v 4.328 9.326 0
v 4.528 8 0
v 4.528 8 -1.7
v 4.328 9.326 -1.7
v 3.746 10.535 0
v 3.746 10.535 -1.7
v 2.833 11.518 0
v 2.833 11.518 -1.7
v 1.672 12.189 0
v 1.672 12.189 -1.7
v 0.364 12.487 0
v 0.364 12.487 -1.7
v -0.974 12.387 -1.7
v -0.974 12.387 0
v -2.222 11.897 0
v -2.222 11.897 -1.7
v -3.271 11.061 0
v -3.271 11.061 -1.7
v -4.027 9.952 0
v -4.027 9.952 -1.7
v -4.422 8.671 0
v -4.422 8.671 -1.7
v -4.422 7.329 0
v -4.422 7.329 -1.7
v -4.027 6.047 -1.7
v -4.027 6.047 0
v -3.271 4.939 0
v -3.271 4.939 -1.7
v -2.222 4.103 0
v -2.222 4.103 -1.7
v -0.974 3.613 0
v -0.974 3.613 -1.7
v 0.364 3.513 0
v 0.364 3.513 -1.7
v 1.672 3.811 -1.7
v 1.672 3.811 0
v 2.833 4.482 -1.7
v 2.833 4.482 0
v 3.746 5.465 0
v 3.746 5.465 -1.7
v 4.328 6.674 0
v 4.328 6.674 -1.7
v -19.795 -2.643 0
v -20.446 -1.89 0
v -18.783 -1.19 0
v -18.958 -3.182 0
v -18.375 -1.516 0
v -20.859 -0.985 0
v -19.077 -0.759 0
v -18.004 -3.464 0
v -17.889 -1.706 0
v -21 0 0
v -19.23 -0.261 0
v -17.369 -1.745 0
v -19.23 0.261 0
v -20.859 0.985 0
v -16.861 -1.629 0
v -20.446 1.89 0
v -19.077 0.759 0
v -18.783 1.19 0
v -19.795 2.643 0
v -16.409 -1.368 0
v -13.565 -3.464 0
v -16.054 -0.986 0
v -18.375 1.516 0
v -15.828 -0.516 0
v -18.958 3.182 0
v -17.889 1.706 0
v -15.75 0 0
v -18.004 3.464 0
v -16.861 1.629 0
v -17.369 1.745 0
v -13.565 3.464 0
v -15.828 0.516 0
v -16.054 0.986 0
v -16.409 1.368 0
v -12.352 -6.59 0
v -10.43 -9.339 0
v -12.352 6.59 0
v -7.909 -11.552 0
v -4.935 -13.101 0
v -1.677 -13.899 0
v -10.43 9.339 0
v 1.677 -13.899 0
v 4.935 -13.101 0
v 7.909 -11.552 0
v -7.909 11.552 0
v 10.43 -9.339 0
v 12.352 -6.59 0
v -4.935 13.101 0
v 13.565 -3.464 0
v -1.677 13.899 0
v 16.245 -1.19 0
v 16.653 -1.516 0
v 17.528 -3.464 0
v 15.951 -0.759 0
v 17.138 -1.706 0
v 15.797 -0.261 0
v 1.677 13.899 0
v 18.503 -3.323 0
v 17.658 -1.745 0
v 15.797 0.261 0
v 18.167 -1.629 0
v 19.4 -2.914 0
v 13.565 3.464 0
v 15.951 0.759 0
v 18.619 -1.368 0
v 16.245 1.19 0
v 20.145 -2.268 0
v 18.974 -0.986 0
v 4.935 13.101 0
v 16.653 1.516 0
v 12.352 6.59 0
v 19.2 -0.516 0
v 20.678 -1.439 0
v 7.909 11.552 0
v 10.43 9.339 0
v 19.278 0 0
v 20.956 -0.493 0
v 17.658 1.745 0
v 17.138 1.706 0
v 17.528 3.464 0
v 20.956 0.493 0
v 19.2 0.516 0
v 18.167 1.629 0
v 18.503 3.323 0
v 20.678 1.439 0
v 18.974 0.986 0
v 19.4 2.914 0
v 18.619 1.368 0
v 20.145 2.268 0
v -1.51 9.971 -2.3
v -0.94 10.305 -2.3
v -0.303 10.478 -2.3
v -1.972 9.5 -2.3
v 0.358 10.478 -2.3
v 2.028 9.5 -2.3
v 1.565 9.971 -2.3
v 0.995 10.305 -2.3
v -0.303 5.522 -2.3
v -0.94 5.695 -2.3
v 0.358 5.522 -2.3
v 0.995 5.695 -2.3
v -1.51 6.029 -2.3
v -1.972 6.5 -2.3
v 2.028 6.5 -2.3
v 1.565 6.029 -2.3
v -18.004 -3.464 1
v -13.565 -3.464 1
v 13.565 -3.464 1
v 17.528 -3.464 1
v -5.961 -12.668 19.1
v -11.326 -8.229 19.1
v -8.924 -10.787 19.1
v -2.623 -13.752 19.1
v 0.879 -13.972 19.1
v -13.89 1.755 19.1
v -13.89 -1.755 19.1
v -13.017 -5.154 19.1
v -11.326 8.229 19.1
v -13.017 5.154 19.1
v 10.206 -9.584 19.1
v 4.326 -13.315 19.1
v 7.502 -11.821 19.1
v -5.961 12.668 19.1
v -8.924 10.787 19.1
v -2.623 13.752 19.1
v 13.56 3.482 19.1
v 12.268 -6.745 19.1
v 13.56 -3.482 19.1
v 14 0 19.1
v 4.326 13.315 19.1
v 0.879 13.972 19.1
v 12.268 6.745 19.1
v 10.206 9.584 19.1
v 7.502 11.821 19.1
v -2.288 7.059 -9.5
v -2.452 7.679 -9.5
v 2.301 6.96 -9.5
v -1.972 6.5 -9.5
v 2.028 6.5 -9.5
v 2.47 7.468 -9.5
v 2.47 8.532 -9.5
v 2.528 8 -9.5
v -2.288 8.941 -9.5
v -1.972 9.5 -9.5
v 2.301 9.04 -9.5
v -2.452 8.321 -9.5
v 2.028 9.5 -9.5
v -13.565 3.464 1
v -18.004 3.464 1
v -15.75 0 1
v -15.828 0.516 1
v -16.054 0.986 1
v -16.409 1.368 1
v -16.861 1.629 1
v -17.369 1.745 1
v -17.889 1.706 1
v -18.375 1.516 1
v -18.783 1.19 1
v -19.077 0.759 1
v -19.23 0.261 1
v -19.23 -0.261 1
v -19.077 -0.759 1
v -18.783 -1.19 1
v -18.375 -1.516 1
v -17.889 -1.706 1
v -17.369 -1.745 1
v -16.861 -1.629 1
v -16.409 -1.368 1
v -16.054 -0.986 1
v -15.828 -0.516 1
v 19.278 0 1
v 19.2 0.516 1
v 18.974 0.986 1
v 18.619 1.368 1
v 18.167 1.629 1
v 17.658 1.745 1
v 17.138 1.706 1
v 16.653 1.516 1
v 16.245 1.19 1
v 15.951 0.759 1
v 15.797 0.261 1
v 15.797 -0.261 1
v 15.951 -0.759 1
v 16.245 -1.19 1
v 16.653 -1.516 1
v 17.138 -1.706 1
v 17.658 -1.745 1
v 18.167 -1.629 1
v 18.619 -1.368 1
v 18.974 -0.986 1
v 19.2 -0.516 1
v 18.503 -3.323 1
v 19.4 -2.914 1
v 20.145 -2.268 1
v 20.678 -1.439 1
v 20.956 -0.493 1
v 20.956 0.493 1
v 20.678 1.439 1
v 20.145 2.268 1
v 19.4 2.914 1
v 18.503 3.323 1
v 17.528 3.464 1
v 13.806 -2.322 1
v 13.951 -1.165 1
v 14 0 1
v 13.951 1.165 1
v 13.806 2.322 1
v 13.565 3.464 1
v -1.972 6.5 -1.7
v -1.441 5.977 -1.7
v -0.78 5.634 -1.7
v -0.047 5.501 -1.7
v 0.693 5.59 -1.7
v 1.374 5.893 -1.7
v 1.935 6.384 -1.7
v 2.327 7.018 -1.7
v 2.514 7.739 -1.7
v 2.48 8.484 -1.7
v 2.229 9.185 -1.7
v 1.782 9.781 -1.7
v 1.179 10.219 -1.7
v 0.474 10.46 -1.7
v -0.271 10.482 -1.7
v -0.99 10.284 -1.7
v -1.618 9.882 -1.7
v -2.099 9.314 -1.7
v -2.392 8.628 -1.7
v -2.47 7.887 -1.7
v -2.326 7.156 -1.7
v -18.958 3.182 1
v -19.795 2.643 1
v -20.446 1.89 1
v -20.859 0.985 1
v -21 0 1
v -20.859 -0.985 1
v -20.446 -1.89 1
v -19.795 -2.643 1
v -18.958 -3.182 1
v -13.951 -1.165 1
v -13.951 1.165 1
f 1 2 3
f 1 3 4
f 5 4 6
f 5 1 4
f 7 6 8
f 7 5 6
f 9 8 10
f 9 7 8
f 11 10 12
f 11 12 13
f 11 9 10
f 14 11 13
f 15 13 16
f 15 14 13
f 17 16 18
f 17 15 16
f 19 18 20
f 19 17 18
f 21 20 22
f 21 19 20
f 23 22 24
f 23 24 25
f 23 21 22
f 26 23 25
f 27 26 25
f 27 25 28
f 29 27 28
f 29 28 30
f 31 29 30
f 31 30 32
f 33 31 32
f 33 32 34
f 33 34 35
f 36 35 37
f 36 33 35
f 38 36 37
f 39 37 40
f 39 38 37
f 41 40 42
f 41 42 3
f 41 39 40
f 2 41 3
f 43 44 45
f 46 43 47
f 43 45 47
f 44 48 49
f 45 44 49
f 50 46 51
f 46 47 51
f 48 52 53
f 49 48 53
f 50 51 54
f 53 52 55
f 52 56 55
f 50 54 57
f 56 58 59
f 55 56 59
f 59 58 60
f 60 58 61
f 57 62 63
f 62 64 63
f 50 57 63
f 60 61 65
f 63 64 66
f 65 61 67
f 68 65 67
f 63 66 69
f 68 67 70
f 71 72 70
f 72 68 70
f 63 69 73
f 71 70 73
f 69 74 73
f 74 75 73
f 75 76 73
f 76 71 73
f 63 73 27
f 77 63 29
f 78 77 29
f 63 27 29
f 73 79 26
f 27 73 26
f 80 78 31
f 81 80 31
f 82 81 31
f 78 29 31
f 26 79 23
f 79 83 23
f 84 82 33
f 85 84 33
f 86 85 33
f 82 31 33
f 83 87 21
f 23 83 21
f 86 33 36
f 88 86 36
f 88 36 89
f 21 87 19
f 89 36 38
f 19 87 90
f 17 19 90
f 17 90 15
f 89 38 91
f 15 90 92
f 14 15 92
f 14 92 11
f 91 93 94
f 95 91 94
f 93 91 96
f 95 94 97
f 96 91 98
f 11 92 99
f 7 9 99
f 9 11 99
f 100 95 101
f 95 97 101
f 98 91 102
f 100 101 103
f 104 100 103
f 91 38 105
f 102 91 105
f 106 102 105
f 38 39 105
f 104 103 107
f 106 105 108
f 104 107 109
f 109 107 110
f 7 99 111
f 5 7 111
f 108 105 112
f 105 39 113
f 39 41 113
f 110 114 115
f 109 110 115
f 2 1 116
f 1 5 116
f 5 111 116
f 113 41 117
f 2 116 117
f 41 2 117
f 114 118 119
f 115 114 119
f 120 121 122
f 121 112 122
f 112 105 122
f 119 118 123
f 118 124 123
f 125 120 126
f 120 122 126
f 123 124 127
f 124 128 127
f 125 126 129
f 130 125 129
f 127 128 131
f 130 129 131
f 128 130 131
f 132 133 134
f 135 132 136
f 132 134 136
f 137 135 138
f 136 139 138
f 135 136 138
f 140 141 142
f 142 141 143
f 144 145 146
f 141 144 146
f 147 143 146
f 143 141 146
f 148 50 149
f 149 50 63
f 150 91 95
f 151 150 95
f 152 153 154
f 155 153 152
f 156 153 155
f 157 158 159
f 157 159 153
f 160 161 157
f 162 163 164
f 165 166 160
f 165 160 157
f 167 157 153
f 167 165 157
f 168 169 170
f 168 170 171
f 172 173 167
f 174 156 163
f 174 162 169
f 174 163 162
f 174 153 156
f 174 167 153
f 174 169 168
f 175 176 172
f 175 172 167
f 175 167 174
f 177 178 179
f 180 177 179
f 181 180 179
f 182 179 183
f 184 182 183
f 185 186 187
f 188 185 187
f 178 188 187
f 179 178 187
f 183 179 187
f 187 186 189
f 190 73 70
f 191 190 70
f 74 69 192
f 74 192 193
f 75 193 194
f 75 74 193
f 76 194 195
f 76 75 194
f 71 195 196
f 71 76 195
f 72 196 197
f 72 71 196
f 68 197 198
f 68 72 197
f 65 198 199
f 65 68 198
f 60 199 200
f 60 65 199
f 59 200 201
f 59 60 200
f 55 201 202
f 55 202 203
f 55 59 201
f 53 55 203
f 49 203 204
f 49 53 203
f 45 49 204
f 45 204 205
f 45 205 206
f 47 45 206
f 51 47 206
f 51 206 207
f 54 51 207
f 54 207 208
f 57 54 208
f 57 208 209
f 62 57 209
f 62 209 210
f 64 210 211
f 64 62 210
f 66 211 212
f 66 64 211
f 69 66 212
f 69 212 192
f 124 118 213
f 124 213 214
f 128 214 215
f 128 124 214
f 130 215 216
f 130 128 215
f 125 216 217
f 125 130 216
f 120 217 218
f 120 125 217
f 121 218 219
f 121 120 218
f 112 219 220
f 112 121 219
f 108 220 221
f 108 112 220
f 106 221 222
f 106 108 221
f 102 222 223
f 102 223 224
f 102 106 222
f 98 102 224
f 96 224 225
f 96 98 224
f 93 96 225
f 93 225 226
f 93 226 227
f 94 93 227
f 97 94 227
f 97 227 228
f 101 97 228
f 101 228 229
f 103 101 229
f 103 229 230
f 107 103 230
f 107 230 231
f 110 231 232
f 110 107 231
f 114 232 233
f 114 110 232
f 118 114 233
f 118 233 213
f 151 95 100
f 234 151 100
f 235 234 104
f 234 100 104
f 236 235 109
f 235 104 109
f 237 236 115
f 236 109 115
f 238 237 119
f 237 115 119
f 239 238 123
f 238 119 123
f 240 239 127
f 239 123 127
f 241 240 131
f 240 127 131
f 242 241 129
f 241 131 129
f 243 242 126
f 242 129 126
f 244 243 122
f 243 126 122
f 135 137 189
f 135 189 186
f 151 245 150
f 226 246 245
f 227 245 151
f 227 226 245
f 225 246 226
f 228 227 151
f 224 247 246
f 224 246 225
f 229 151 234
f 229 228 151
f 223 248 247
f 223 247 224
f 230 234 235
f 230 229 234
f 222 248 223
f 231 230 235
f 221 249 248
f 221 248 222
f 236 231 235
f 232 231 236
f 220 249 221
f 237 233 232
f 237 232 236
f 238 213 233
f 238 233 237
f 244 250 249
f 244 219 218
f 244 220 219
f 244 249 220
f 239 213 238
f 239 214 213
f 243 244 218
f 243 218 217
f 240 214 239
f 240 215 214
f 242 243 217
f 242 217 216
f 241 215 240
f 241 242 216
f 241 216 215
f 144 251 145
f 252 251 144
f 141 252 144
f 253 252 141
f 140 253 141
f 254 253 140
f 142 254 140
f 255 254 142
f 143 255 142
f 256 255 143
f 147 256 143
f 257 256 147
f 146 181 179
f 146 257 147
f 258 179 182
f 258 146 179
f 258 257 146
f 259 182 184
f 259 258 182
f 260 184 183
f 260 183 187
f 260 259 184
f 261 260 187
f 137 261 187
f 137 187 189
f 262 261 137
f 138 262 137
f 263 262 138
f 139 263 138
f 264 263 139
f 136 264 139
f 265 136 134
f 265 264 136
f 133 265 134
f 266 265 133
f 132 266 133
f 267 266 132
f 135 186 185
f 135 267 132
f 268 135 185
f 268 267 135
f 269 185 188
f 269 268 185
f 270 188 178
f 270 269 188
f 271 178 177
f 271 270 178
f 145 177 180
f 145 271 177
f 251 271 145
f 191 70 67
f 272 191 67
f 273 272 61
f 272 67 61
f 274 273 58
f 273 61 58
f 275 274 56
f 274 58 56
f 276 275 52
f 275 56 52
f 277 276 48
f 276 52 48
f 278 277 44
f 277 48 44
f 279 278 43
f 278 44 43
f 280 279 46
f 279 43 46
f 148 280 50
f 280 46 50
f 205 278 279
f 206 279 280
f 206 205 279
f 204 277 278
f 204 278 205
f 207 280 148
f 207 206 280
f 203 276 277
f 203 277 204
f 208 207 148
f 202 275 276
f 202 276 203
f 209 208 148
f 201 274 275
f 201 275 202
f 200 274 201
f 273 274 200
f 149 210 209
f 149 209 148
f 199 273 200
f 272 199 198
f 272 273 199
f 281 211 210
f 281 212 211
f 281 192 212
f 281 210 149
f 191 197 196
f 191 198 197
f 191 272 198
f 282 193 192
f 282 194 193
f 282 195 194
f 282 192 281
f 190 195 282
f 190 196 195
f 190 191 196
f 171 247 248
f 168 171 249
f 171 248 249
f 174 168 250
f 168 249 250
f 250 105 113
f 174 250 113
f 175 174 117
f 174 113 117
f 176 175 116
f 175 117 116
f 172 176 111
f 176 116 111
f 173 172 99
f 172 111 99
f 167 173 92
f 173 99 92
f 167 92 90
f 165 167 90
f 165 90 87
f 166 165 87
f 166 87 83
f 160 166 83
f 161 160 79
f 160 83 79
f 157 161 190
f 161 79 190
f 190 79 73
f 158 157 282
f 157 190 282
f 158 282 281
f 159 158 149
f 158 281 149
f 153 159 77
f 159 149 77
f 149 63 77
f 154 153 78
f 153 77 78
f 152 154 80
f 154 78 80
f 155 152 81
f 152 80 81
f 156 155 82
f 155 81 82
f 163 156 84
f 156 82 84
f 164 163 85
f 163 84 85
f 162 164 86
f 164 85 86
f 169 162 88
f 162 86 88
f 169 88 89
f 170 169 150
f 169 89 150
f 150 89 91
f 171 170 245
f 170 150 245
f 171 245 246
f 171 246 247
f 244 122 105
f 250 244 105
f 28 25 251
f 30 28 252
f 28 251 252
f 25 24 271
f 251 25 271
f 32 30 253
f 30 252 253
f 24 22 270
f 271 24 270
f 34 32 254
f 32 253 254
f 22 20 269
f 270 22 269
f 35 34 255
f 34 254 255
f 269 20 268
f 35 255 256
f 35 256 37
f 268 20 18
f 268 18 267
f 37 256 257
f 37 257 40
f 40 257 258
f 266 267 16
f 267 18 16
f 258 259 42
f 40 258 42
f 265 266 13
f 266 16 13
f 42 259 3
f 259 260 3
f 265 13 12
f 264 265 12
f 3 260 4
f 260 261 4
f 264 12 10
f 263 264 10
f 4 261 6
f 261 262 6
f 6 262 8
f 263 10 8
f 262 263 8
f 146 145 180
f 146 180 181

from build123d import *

# Parameters (mm, degrees)
SKETCH1_R           = 14
BOSS_EXTRUDE1_DEPTH = 19.1
SKETCH1_3_R         = 4.5
BOSS_EXTRUDE2_DEPTH = 1.7
BOSS_EXTRUDE4_DEPTH = 2.3
BOSS_EXTRUDE5_DEPTH = 9.5
BOSS_EXTRUDE6_DEPTH = 2.3
SKETCH1_9_R         = 1.75
BOSS_EXTRUDE7_DEPTH = 1


with BuildPart() as part:
    # Sketch1 → Boss-Extrude1 (new body)
    with BuildSketch(Plane.XY):
        Circle(SKETCH1_R)
    extrude(amount=BOSS_EXTRUDE1_DEPTH)

    # Sketch1<3> → Boss-Extrude2 (add)
    with BuildSketch(Plane.XY):
        with Locations((0.027687475, 7.999952088)):
            Circle(SKETCH1_3_R)
        with BuildLine():
            ThreePointArc((-1.972312525, 6.499952088), (-2.472312525, 7.999952088), (-1.972312525, 9.499952088))
            ThreePointArc((-1.972312525, 9.499952088), (0.027687475, 10.499952088), (2.027687475, 9.499952088))
            ThreePointArc((2.027687475, 9.499952088), (2.39939572, 8.790521503), (2.527687475, 7.999952088))
            ThreePointArc((2.527687475, 7.999952088), (2.39939572, 7.209382673), (2.027687475, 6.499952088))
            ThreePointArc((2.027687475, 6.499952088), (0.027687475, 5.499952088), (-1.972312525, 6.499952088))
        make_face(mode=Mode.SUBTRACT)
    extrude(amount=-BOSS_EXTRUDE2_DEPTH)

    # Sketch1<6> → Boss-Extrude4 (add)
    with BuildSketch(Plane.XY):
        with BuildLine():
            Line((-1.972312525, 9.499952088), (0.027687475, 9.499952088))
            Line((0.027687475, 9.499952088), (2.027687475, 9.499952088))
            ThreePointArc((2.027687475, 9.499952088), (0.027687475, 10.499952088), (-1.972312525, 9.499952088))
        make_face()
    extrude(amount=-BOSS_EXTRUDE4_DEPTH)

    # Sketch1<7> → Boss-Extrude5 (add)
    with BuildSketch(Plane.XY):
        with BuildLine():
            Line((2.027687475, 9.499952088), (-1.972312525, 9.499952088))
            ThreePointArc((-1.972312525, 9.499952088), (-2.472312525, 7.999952088), (-1.972312525, 6.499952088))
            Line((-1.972312525, 6.499952088), (2.027687475, 6.499952088))
            ThreePointArc((2.027687475, 6.499952088), (2.527687475, 7.999952088), (2.027687475, 9.499952088))
        make_face()
    extrude(amount=-BOSS_EXTRUDE5_DEPTH)

    # Sketch1<8> → Boss-Extrude6 (add)
    with BuildSketch(Plane.XY):
        with BuildLine():
            Line((2.027687475, 6.499952088), (0.027687475, 6.499952088))
            Line((0.027687475, 6.499952088), (-1.972312525, 6.499952088))
            ThreePointArc((-1.972312525, 6.499952088), (0.027687475, 5.499952088), (2.027687475, 6.499952088))
        make_face()
    extrude(amount=-BOSS_EXTRUDE6_DEPTH)

    # Sketch1<9> → Boss-Extrude7 (add)
    # profile 1 of 2: a face of its own
    with BuildSketch(Plane.XY):
        with BuildLine():
            Line((-13.564798107, 3.46356064), (-18.003733752, 3.46356064))
            ThreePointArc((-18.003733752, 3.46356064), (-21, 0), (-18.003733752, -3.46356064))
            Line((-18.003733752, -3.46356064), (-13.564798107, -3.46356064))
            ThreePointArc((-13.564798107, -3.46356064), (-14, 0), (-13.564798107, 3.46356064))
        make_face()
        with Locations((-17.5, 0)):
            Circle(SKETCH1_9_R, mode=Mode.SUBTRACT)
    # profile 2 of 2: a face of its own
    with BuildSketch(Plane.XY):
        with BuildLine():
            Line((17.527687475, 3.46356064), (13.564798107, 3.46356064))
            ThreePointArc((13.564798107, 3.46356064), (14, 0), (13.564798107, -3.46356064))
            Line((13.564798107, -3.46356064), (17.527687475, -3.46356064))
            ThreePointArc((17.527687475, -3.46356064), (20.991248115, 0), (17.527687475, 3.46356064))
        make_face()
        with Locations((17.527687475, 0)):
            Circle(SKETCH1_9_R, mode=Mode.SUBTRACT)
    extrude(amount=BOSS_EXTRUDE7_DEPTH)


solid = part.part
